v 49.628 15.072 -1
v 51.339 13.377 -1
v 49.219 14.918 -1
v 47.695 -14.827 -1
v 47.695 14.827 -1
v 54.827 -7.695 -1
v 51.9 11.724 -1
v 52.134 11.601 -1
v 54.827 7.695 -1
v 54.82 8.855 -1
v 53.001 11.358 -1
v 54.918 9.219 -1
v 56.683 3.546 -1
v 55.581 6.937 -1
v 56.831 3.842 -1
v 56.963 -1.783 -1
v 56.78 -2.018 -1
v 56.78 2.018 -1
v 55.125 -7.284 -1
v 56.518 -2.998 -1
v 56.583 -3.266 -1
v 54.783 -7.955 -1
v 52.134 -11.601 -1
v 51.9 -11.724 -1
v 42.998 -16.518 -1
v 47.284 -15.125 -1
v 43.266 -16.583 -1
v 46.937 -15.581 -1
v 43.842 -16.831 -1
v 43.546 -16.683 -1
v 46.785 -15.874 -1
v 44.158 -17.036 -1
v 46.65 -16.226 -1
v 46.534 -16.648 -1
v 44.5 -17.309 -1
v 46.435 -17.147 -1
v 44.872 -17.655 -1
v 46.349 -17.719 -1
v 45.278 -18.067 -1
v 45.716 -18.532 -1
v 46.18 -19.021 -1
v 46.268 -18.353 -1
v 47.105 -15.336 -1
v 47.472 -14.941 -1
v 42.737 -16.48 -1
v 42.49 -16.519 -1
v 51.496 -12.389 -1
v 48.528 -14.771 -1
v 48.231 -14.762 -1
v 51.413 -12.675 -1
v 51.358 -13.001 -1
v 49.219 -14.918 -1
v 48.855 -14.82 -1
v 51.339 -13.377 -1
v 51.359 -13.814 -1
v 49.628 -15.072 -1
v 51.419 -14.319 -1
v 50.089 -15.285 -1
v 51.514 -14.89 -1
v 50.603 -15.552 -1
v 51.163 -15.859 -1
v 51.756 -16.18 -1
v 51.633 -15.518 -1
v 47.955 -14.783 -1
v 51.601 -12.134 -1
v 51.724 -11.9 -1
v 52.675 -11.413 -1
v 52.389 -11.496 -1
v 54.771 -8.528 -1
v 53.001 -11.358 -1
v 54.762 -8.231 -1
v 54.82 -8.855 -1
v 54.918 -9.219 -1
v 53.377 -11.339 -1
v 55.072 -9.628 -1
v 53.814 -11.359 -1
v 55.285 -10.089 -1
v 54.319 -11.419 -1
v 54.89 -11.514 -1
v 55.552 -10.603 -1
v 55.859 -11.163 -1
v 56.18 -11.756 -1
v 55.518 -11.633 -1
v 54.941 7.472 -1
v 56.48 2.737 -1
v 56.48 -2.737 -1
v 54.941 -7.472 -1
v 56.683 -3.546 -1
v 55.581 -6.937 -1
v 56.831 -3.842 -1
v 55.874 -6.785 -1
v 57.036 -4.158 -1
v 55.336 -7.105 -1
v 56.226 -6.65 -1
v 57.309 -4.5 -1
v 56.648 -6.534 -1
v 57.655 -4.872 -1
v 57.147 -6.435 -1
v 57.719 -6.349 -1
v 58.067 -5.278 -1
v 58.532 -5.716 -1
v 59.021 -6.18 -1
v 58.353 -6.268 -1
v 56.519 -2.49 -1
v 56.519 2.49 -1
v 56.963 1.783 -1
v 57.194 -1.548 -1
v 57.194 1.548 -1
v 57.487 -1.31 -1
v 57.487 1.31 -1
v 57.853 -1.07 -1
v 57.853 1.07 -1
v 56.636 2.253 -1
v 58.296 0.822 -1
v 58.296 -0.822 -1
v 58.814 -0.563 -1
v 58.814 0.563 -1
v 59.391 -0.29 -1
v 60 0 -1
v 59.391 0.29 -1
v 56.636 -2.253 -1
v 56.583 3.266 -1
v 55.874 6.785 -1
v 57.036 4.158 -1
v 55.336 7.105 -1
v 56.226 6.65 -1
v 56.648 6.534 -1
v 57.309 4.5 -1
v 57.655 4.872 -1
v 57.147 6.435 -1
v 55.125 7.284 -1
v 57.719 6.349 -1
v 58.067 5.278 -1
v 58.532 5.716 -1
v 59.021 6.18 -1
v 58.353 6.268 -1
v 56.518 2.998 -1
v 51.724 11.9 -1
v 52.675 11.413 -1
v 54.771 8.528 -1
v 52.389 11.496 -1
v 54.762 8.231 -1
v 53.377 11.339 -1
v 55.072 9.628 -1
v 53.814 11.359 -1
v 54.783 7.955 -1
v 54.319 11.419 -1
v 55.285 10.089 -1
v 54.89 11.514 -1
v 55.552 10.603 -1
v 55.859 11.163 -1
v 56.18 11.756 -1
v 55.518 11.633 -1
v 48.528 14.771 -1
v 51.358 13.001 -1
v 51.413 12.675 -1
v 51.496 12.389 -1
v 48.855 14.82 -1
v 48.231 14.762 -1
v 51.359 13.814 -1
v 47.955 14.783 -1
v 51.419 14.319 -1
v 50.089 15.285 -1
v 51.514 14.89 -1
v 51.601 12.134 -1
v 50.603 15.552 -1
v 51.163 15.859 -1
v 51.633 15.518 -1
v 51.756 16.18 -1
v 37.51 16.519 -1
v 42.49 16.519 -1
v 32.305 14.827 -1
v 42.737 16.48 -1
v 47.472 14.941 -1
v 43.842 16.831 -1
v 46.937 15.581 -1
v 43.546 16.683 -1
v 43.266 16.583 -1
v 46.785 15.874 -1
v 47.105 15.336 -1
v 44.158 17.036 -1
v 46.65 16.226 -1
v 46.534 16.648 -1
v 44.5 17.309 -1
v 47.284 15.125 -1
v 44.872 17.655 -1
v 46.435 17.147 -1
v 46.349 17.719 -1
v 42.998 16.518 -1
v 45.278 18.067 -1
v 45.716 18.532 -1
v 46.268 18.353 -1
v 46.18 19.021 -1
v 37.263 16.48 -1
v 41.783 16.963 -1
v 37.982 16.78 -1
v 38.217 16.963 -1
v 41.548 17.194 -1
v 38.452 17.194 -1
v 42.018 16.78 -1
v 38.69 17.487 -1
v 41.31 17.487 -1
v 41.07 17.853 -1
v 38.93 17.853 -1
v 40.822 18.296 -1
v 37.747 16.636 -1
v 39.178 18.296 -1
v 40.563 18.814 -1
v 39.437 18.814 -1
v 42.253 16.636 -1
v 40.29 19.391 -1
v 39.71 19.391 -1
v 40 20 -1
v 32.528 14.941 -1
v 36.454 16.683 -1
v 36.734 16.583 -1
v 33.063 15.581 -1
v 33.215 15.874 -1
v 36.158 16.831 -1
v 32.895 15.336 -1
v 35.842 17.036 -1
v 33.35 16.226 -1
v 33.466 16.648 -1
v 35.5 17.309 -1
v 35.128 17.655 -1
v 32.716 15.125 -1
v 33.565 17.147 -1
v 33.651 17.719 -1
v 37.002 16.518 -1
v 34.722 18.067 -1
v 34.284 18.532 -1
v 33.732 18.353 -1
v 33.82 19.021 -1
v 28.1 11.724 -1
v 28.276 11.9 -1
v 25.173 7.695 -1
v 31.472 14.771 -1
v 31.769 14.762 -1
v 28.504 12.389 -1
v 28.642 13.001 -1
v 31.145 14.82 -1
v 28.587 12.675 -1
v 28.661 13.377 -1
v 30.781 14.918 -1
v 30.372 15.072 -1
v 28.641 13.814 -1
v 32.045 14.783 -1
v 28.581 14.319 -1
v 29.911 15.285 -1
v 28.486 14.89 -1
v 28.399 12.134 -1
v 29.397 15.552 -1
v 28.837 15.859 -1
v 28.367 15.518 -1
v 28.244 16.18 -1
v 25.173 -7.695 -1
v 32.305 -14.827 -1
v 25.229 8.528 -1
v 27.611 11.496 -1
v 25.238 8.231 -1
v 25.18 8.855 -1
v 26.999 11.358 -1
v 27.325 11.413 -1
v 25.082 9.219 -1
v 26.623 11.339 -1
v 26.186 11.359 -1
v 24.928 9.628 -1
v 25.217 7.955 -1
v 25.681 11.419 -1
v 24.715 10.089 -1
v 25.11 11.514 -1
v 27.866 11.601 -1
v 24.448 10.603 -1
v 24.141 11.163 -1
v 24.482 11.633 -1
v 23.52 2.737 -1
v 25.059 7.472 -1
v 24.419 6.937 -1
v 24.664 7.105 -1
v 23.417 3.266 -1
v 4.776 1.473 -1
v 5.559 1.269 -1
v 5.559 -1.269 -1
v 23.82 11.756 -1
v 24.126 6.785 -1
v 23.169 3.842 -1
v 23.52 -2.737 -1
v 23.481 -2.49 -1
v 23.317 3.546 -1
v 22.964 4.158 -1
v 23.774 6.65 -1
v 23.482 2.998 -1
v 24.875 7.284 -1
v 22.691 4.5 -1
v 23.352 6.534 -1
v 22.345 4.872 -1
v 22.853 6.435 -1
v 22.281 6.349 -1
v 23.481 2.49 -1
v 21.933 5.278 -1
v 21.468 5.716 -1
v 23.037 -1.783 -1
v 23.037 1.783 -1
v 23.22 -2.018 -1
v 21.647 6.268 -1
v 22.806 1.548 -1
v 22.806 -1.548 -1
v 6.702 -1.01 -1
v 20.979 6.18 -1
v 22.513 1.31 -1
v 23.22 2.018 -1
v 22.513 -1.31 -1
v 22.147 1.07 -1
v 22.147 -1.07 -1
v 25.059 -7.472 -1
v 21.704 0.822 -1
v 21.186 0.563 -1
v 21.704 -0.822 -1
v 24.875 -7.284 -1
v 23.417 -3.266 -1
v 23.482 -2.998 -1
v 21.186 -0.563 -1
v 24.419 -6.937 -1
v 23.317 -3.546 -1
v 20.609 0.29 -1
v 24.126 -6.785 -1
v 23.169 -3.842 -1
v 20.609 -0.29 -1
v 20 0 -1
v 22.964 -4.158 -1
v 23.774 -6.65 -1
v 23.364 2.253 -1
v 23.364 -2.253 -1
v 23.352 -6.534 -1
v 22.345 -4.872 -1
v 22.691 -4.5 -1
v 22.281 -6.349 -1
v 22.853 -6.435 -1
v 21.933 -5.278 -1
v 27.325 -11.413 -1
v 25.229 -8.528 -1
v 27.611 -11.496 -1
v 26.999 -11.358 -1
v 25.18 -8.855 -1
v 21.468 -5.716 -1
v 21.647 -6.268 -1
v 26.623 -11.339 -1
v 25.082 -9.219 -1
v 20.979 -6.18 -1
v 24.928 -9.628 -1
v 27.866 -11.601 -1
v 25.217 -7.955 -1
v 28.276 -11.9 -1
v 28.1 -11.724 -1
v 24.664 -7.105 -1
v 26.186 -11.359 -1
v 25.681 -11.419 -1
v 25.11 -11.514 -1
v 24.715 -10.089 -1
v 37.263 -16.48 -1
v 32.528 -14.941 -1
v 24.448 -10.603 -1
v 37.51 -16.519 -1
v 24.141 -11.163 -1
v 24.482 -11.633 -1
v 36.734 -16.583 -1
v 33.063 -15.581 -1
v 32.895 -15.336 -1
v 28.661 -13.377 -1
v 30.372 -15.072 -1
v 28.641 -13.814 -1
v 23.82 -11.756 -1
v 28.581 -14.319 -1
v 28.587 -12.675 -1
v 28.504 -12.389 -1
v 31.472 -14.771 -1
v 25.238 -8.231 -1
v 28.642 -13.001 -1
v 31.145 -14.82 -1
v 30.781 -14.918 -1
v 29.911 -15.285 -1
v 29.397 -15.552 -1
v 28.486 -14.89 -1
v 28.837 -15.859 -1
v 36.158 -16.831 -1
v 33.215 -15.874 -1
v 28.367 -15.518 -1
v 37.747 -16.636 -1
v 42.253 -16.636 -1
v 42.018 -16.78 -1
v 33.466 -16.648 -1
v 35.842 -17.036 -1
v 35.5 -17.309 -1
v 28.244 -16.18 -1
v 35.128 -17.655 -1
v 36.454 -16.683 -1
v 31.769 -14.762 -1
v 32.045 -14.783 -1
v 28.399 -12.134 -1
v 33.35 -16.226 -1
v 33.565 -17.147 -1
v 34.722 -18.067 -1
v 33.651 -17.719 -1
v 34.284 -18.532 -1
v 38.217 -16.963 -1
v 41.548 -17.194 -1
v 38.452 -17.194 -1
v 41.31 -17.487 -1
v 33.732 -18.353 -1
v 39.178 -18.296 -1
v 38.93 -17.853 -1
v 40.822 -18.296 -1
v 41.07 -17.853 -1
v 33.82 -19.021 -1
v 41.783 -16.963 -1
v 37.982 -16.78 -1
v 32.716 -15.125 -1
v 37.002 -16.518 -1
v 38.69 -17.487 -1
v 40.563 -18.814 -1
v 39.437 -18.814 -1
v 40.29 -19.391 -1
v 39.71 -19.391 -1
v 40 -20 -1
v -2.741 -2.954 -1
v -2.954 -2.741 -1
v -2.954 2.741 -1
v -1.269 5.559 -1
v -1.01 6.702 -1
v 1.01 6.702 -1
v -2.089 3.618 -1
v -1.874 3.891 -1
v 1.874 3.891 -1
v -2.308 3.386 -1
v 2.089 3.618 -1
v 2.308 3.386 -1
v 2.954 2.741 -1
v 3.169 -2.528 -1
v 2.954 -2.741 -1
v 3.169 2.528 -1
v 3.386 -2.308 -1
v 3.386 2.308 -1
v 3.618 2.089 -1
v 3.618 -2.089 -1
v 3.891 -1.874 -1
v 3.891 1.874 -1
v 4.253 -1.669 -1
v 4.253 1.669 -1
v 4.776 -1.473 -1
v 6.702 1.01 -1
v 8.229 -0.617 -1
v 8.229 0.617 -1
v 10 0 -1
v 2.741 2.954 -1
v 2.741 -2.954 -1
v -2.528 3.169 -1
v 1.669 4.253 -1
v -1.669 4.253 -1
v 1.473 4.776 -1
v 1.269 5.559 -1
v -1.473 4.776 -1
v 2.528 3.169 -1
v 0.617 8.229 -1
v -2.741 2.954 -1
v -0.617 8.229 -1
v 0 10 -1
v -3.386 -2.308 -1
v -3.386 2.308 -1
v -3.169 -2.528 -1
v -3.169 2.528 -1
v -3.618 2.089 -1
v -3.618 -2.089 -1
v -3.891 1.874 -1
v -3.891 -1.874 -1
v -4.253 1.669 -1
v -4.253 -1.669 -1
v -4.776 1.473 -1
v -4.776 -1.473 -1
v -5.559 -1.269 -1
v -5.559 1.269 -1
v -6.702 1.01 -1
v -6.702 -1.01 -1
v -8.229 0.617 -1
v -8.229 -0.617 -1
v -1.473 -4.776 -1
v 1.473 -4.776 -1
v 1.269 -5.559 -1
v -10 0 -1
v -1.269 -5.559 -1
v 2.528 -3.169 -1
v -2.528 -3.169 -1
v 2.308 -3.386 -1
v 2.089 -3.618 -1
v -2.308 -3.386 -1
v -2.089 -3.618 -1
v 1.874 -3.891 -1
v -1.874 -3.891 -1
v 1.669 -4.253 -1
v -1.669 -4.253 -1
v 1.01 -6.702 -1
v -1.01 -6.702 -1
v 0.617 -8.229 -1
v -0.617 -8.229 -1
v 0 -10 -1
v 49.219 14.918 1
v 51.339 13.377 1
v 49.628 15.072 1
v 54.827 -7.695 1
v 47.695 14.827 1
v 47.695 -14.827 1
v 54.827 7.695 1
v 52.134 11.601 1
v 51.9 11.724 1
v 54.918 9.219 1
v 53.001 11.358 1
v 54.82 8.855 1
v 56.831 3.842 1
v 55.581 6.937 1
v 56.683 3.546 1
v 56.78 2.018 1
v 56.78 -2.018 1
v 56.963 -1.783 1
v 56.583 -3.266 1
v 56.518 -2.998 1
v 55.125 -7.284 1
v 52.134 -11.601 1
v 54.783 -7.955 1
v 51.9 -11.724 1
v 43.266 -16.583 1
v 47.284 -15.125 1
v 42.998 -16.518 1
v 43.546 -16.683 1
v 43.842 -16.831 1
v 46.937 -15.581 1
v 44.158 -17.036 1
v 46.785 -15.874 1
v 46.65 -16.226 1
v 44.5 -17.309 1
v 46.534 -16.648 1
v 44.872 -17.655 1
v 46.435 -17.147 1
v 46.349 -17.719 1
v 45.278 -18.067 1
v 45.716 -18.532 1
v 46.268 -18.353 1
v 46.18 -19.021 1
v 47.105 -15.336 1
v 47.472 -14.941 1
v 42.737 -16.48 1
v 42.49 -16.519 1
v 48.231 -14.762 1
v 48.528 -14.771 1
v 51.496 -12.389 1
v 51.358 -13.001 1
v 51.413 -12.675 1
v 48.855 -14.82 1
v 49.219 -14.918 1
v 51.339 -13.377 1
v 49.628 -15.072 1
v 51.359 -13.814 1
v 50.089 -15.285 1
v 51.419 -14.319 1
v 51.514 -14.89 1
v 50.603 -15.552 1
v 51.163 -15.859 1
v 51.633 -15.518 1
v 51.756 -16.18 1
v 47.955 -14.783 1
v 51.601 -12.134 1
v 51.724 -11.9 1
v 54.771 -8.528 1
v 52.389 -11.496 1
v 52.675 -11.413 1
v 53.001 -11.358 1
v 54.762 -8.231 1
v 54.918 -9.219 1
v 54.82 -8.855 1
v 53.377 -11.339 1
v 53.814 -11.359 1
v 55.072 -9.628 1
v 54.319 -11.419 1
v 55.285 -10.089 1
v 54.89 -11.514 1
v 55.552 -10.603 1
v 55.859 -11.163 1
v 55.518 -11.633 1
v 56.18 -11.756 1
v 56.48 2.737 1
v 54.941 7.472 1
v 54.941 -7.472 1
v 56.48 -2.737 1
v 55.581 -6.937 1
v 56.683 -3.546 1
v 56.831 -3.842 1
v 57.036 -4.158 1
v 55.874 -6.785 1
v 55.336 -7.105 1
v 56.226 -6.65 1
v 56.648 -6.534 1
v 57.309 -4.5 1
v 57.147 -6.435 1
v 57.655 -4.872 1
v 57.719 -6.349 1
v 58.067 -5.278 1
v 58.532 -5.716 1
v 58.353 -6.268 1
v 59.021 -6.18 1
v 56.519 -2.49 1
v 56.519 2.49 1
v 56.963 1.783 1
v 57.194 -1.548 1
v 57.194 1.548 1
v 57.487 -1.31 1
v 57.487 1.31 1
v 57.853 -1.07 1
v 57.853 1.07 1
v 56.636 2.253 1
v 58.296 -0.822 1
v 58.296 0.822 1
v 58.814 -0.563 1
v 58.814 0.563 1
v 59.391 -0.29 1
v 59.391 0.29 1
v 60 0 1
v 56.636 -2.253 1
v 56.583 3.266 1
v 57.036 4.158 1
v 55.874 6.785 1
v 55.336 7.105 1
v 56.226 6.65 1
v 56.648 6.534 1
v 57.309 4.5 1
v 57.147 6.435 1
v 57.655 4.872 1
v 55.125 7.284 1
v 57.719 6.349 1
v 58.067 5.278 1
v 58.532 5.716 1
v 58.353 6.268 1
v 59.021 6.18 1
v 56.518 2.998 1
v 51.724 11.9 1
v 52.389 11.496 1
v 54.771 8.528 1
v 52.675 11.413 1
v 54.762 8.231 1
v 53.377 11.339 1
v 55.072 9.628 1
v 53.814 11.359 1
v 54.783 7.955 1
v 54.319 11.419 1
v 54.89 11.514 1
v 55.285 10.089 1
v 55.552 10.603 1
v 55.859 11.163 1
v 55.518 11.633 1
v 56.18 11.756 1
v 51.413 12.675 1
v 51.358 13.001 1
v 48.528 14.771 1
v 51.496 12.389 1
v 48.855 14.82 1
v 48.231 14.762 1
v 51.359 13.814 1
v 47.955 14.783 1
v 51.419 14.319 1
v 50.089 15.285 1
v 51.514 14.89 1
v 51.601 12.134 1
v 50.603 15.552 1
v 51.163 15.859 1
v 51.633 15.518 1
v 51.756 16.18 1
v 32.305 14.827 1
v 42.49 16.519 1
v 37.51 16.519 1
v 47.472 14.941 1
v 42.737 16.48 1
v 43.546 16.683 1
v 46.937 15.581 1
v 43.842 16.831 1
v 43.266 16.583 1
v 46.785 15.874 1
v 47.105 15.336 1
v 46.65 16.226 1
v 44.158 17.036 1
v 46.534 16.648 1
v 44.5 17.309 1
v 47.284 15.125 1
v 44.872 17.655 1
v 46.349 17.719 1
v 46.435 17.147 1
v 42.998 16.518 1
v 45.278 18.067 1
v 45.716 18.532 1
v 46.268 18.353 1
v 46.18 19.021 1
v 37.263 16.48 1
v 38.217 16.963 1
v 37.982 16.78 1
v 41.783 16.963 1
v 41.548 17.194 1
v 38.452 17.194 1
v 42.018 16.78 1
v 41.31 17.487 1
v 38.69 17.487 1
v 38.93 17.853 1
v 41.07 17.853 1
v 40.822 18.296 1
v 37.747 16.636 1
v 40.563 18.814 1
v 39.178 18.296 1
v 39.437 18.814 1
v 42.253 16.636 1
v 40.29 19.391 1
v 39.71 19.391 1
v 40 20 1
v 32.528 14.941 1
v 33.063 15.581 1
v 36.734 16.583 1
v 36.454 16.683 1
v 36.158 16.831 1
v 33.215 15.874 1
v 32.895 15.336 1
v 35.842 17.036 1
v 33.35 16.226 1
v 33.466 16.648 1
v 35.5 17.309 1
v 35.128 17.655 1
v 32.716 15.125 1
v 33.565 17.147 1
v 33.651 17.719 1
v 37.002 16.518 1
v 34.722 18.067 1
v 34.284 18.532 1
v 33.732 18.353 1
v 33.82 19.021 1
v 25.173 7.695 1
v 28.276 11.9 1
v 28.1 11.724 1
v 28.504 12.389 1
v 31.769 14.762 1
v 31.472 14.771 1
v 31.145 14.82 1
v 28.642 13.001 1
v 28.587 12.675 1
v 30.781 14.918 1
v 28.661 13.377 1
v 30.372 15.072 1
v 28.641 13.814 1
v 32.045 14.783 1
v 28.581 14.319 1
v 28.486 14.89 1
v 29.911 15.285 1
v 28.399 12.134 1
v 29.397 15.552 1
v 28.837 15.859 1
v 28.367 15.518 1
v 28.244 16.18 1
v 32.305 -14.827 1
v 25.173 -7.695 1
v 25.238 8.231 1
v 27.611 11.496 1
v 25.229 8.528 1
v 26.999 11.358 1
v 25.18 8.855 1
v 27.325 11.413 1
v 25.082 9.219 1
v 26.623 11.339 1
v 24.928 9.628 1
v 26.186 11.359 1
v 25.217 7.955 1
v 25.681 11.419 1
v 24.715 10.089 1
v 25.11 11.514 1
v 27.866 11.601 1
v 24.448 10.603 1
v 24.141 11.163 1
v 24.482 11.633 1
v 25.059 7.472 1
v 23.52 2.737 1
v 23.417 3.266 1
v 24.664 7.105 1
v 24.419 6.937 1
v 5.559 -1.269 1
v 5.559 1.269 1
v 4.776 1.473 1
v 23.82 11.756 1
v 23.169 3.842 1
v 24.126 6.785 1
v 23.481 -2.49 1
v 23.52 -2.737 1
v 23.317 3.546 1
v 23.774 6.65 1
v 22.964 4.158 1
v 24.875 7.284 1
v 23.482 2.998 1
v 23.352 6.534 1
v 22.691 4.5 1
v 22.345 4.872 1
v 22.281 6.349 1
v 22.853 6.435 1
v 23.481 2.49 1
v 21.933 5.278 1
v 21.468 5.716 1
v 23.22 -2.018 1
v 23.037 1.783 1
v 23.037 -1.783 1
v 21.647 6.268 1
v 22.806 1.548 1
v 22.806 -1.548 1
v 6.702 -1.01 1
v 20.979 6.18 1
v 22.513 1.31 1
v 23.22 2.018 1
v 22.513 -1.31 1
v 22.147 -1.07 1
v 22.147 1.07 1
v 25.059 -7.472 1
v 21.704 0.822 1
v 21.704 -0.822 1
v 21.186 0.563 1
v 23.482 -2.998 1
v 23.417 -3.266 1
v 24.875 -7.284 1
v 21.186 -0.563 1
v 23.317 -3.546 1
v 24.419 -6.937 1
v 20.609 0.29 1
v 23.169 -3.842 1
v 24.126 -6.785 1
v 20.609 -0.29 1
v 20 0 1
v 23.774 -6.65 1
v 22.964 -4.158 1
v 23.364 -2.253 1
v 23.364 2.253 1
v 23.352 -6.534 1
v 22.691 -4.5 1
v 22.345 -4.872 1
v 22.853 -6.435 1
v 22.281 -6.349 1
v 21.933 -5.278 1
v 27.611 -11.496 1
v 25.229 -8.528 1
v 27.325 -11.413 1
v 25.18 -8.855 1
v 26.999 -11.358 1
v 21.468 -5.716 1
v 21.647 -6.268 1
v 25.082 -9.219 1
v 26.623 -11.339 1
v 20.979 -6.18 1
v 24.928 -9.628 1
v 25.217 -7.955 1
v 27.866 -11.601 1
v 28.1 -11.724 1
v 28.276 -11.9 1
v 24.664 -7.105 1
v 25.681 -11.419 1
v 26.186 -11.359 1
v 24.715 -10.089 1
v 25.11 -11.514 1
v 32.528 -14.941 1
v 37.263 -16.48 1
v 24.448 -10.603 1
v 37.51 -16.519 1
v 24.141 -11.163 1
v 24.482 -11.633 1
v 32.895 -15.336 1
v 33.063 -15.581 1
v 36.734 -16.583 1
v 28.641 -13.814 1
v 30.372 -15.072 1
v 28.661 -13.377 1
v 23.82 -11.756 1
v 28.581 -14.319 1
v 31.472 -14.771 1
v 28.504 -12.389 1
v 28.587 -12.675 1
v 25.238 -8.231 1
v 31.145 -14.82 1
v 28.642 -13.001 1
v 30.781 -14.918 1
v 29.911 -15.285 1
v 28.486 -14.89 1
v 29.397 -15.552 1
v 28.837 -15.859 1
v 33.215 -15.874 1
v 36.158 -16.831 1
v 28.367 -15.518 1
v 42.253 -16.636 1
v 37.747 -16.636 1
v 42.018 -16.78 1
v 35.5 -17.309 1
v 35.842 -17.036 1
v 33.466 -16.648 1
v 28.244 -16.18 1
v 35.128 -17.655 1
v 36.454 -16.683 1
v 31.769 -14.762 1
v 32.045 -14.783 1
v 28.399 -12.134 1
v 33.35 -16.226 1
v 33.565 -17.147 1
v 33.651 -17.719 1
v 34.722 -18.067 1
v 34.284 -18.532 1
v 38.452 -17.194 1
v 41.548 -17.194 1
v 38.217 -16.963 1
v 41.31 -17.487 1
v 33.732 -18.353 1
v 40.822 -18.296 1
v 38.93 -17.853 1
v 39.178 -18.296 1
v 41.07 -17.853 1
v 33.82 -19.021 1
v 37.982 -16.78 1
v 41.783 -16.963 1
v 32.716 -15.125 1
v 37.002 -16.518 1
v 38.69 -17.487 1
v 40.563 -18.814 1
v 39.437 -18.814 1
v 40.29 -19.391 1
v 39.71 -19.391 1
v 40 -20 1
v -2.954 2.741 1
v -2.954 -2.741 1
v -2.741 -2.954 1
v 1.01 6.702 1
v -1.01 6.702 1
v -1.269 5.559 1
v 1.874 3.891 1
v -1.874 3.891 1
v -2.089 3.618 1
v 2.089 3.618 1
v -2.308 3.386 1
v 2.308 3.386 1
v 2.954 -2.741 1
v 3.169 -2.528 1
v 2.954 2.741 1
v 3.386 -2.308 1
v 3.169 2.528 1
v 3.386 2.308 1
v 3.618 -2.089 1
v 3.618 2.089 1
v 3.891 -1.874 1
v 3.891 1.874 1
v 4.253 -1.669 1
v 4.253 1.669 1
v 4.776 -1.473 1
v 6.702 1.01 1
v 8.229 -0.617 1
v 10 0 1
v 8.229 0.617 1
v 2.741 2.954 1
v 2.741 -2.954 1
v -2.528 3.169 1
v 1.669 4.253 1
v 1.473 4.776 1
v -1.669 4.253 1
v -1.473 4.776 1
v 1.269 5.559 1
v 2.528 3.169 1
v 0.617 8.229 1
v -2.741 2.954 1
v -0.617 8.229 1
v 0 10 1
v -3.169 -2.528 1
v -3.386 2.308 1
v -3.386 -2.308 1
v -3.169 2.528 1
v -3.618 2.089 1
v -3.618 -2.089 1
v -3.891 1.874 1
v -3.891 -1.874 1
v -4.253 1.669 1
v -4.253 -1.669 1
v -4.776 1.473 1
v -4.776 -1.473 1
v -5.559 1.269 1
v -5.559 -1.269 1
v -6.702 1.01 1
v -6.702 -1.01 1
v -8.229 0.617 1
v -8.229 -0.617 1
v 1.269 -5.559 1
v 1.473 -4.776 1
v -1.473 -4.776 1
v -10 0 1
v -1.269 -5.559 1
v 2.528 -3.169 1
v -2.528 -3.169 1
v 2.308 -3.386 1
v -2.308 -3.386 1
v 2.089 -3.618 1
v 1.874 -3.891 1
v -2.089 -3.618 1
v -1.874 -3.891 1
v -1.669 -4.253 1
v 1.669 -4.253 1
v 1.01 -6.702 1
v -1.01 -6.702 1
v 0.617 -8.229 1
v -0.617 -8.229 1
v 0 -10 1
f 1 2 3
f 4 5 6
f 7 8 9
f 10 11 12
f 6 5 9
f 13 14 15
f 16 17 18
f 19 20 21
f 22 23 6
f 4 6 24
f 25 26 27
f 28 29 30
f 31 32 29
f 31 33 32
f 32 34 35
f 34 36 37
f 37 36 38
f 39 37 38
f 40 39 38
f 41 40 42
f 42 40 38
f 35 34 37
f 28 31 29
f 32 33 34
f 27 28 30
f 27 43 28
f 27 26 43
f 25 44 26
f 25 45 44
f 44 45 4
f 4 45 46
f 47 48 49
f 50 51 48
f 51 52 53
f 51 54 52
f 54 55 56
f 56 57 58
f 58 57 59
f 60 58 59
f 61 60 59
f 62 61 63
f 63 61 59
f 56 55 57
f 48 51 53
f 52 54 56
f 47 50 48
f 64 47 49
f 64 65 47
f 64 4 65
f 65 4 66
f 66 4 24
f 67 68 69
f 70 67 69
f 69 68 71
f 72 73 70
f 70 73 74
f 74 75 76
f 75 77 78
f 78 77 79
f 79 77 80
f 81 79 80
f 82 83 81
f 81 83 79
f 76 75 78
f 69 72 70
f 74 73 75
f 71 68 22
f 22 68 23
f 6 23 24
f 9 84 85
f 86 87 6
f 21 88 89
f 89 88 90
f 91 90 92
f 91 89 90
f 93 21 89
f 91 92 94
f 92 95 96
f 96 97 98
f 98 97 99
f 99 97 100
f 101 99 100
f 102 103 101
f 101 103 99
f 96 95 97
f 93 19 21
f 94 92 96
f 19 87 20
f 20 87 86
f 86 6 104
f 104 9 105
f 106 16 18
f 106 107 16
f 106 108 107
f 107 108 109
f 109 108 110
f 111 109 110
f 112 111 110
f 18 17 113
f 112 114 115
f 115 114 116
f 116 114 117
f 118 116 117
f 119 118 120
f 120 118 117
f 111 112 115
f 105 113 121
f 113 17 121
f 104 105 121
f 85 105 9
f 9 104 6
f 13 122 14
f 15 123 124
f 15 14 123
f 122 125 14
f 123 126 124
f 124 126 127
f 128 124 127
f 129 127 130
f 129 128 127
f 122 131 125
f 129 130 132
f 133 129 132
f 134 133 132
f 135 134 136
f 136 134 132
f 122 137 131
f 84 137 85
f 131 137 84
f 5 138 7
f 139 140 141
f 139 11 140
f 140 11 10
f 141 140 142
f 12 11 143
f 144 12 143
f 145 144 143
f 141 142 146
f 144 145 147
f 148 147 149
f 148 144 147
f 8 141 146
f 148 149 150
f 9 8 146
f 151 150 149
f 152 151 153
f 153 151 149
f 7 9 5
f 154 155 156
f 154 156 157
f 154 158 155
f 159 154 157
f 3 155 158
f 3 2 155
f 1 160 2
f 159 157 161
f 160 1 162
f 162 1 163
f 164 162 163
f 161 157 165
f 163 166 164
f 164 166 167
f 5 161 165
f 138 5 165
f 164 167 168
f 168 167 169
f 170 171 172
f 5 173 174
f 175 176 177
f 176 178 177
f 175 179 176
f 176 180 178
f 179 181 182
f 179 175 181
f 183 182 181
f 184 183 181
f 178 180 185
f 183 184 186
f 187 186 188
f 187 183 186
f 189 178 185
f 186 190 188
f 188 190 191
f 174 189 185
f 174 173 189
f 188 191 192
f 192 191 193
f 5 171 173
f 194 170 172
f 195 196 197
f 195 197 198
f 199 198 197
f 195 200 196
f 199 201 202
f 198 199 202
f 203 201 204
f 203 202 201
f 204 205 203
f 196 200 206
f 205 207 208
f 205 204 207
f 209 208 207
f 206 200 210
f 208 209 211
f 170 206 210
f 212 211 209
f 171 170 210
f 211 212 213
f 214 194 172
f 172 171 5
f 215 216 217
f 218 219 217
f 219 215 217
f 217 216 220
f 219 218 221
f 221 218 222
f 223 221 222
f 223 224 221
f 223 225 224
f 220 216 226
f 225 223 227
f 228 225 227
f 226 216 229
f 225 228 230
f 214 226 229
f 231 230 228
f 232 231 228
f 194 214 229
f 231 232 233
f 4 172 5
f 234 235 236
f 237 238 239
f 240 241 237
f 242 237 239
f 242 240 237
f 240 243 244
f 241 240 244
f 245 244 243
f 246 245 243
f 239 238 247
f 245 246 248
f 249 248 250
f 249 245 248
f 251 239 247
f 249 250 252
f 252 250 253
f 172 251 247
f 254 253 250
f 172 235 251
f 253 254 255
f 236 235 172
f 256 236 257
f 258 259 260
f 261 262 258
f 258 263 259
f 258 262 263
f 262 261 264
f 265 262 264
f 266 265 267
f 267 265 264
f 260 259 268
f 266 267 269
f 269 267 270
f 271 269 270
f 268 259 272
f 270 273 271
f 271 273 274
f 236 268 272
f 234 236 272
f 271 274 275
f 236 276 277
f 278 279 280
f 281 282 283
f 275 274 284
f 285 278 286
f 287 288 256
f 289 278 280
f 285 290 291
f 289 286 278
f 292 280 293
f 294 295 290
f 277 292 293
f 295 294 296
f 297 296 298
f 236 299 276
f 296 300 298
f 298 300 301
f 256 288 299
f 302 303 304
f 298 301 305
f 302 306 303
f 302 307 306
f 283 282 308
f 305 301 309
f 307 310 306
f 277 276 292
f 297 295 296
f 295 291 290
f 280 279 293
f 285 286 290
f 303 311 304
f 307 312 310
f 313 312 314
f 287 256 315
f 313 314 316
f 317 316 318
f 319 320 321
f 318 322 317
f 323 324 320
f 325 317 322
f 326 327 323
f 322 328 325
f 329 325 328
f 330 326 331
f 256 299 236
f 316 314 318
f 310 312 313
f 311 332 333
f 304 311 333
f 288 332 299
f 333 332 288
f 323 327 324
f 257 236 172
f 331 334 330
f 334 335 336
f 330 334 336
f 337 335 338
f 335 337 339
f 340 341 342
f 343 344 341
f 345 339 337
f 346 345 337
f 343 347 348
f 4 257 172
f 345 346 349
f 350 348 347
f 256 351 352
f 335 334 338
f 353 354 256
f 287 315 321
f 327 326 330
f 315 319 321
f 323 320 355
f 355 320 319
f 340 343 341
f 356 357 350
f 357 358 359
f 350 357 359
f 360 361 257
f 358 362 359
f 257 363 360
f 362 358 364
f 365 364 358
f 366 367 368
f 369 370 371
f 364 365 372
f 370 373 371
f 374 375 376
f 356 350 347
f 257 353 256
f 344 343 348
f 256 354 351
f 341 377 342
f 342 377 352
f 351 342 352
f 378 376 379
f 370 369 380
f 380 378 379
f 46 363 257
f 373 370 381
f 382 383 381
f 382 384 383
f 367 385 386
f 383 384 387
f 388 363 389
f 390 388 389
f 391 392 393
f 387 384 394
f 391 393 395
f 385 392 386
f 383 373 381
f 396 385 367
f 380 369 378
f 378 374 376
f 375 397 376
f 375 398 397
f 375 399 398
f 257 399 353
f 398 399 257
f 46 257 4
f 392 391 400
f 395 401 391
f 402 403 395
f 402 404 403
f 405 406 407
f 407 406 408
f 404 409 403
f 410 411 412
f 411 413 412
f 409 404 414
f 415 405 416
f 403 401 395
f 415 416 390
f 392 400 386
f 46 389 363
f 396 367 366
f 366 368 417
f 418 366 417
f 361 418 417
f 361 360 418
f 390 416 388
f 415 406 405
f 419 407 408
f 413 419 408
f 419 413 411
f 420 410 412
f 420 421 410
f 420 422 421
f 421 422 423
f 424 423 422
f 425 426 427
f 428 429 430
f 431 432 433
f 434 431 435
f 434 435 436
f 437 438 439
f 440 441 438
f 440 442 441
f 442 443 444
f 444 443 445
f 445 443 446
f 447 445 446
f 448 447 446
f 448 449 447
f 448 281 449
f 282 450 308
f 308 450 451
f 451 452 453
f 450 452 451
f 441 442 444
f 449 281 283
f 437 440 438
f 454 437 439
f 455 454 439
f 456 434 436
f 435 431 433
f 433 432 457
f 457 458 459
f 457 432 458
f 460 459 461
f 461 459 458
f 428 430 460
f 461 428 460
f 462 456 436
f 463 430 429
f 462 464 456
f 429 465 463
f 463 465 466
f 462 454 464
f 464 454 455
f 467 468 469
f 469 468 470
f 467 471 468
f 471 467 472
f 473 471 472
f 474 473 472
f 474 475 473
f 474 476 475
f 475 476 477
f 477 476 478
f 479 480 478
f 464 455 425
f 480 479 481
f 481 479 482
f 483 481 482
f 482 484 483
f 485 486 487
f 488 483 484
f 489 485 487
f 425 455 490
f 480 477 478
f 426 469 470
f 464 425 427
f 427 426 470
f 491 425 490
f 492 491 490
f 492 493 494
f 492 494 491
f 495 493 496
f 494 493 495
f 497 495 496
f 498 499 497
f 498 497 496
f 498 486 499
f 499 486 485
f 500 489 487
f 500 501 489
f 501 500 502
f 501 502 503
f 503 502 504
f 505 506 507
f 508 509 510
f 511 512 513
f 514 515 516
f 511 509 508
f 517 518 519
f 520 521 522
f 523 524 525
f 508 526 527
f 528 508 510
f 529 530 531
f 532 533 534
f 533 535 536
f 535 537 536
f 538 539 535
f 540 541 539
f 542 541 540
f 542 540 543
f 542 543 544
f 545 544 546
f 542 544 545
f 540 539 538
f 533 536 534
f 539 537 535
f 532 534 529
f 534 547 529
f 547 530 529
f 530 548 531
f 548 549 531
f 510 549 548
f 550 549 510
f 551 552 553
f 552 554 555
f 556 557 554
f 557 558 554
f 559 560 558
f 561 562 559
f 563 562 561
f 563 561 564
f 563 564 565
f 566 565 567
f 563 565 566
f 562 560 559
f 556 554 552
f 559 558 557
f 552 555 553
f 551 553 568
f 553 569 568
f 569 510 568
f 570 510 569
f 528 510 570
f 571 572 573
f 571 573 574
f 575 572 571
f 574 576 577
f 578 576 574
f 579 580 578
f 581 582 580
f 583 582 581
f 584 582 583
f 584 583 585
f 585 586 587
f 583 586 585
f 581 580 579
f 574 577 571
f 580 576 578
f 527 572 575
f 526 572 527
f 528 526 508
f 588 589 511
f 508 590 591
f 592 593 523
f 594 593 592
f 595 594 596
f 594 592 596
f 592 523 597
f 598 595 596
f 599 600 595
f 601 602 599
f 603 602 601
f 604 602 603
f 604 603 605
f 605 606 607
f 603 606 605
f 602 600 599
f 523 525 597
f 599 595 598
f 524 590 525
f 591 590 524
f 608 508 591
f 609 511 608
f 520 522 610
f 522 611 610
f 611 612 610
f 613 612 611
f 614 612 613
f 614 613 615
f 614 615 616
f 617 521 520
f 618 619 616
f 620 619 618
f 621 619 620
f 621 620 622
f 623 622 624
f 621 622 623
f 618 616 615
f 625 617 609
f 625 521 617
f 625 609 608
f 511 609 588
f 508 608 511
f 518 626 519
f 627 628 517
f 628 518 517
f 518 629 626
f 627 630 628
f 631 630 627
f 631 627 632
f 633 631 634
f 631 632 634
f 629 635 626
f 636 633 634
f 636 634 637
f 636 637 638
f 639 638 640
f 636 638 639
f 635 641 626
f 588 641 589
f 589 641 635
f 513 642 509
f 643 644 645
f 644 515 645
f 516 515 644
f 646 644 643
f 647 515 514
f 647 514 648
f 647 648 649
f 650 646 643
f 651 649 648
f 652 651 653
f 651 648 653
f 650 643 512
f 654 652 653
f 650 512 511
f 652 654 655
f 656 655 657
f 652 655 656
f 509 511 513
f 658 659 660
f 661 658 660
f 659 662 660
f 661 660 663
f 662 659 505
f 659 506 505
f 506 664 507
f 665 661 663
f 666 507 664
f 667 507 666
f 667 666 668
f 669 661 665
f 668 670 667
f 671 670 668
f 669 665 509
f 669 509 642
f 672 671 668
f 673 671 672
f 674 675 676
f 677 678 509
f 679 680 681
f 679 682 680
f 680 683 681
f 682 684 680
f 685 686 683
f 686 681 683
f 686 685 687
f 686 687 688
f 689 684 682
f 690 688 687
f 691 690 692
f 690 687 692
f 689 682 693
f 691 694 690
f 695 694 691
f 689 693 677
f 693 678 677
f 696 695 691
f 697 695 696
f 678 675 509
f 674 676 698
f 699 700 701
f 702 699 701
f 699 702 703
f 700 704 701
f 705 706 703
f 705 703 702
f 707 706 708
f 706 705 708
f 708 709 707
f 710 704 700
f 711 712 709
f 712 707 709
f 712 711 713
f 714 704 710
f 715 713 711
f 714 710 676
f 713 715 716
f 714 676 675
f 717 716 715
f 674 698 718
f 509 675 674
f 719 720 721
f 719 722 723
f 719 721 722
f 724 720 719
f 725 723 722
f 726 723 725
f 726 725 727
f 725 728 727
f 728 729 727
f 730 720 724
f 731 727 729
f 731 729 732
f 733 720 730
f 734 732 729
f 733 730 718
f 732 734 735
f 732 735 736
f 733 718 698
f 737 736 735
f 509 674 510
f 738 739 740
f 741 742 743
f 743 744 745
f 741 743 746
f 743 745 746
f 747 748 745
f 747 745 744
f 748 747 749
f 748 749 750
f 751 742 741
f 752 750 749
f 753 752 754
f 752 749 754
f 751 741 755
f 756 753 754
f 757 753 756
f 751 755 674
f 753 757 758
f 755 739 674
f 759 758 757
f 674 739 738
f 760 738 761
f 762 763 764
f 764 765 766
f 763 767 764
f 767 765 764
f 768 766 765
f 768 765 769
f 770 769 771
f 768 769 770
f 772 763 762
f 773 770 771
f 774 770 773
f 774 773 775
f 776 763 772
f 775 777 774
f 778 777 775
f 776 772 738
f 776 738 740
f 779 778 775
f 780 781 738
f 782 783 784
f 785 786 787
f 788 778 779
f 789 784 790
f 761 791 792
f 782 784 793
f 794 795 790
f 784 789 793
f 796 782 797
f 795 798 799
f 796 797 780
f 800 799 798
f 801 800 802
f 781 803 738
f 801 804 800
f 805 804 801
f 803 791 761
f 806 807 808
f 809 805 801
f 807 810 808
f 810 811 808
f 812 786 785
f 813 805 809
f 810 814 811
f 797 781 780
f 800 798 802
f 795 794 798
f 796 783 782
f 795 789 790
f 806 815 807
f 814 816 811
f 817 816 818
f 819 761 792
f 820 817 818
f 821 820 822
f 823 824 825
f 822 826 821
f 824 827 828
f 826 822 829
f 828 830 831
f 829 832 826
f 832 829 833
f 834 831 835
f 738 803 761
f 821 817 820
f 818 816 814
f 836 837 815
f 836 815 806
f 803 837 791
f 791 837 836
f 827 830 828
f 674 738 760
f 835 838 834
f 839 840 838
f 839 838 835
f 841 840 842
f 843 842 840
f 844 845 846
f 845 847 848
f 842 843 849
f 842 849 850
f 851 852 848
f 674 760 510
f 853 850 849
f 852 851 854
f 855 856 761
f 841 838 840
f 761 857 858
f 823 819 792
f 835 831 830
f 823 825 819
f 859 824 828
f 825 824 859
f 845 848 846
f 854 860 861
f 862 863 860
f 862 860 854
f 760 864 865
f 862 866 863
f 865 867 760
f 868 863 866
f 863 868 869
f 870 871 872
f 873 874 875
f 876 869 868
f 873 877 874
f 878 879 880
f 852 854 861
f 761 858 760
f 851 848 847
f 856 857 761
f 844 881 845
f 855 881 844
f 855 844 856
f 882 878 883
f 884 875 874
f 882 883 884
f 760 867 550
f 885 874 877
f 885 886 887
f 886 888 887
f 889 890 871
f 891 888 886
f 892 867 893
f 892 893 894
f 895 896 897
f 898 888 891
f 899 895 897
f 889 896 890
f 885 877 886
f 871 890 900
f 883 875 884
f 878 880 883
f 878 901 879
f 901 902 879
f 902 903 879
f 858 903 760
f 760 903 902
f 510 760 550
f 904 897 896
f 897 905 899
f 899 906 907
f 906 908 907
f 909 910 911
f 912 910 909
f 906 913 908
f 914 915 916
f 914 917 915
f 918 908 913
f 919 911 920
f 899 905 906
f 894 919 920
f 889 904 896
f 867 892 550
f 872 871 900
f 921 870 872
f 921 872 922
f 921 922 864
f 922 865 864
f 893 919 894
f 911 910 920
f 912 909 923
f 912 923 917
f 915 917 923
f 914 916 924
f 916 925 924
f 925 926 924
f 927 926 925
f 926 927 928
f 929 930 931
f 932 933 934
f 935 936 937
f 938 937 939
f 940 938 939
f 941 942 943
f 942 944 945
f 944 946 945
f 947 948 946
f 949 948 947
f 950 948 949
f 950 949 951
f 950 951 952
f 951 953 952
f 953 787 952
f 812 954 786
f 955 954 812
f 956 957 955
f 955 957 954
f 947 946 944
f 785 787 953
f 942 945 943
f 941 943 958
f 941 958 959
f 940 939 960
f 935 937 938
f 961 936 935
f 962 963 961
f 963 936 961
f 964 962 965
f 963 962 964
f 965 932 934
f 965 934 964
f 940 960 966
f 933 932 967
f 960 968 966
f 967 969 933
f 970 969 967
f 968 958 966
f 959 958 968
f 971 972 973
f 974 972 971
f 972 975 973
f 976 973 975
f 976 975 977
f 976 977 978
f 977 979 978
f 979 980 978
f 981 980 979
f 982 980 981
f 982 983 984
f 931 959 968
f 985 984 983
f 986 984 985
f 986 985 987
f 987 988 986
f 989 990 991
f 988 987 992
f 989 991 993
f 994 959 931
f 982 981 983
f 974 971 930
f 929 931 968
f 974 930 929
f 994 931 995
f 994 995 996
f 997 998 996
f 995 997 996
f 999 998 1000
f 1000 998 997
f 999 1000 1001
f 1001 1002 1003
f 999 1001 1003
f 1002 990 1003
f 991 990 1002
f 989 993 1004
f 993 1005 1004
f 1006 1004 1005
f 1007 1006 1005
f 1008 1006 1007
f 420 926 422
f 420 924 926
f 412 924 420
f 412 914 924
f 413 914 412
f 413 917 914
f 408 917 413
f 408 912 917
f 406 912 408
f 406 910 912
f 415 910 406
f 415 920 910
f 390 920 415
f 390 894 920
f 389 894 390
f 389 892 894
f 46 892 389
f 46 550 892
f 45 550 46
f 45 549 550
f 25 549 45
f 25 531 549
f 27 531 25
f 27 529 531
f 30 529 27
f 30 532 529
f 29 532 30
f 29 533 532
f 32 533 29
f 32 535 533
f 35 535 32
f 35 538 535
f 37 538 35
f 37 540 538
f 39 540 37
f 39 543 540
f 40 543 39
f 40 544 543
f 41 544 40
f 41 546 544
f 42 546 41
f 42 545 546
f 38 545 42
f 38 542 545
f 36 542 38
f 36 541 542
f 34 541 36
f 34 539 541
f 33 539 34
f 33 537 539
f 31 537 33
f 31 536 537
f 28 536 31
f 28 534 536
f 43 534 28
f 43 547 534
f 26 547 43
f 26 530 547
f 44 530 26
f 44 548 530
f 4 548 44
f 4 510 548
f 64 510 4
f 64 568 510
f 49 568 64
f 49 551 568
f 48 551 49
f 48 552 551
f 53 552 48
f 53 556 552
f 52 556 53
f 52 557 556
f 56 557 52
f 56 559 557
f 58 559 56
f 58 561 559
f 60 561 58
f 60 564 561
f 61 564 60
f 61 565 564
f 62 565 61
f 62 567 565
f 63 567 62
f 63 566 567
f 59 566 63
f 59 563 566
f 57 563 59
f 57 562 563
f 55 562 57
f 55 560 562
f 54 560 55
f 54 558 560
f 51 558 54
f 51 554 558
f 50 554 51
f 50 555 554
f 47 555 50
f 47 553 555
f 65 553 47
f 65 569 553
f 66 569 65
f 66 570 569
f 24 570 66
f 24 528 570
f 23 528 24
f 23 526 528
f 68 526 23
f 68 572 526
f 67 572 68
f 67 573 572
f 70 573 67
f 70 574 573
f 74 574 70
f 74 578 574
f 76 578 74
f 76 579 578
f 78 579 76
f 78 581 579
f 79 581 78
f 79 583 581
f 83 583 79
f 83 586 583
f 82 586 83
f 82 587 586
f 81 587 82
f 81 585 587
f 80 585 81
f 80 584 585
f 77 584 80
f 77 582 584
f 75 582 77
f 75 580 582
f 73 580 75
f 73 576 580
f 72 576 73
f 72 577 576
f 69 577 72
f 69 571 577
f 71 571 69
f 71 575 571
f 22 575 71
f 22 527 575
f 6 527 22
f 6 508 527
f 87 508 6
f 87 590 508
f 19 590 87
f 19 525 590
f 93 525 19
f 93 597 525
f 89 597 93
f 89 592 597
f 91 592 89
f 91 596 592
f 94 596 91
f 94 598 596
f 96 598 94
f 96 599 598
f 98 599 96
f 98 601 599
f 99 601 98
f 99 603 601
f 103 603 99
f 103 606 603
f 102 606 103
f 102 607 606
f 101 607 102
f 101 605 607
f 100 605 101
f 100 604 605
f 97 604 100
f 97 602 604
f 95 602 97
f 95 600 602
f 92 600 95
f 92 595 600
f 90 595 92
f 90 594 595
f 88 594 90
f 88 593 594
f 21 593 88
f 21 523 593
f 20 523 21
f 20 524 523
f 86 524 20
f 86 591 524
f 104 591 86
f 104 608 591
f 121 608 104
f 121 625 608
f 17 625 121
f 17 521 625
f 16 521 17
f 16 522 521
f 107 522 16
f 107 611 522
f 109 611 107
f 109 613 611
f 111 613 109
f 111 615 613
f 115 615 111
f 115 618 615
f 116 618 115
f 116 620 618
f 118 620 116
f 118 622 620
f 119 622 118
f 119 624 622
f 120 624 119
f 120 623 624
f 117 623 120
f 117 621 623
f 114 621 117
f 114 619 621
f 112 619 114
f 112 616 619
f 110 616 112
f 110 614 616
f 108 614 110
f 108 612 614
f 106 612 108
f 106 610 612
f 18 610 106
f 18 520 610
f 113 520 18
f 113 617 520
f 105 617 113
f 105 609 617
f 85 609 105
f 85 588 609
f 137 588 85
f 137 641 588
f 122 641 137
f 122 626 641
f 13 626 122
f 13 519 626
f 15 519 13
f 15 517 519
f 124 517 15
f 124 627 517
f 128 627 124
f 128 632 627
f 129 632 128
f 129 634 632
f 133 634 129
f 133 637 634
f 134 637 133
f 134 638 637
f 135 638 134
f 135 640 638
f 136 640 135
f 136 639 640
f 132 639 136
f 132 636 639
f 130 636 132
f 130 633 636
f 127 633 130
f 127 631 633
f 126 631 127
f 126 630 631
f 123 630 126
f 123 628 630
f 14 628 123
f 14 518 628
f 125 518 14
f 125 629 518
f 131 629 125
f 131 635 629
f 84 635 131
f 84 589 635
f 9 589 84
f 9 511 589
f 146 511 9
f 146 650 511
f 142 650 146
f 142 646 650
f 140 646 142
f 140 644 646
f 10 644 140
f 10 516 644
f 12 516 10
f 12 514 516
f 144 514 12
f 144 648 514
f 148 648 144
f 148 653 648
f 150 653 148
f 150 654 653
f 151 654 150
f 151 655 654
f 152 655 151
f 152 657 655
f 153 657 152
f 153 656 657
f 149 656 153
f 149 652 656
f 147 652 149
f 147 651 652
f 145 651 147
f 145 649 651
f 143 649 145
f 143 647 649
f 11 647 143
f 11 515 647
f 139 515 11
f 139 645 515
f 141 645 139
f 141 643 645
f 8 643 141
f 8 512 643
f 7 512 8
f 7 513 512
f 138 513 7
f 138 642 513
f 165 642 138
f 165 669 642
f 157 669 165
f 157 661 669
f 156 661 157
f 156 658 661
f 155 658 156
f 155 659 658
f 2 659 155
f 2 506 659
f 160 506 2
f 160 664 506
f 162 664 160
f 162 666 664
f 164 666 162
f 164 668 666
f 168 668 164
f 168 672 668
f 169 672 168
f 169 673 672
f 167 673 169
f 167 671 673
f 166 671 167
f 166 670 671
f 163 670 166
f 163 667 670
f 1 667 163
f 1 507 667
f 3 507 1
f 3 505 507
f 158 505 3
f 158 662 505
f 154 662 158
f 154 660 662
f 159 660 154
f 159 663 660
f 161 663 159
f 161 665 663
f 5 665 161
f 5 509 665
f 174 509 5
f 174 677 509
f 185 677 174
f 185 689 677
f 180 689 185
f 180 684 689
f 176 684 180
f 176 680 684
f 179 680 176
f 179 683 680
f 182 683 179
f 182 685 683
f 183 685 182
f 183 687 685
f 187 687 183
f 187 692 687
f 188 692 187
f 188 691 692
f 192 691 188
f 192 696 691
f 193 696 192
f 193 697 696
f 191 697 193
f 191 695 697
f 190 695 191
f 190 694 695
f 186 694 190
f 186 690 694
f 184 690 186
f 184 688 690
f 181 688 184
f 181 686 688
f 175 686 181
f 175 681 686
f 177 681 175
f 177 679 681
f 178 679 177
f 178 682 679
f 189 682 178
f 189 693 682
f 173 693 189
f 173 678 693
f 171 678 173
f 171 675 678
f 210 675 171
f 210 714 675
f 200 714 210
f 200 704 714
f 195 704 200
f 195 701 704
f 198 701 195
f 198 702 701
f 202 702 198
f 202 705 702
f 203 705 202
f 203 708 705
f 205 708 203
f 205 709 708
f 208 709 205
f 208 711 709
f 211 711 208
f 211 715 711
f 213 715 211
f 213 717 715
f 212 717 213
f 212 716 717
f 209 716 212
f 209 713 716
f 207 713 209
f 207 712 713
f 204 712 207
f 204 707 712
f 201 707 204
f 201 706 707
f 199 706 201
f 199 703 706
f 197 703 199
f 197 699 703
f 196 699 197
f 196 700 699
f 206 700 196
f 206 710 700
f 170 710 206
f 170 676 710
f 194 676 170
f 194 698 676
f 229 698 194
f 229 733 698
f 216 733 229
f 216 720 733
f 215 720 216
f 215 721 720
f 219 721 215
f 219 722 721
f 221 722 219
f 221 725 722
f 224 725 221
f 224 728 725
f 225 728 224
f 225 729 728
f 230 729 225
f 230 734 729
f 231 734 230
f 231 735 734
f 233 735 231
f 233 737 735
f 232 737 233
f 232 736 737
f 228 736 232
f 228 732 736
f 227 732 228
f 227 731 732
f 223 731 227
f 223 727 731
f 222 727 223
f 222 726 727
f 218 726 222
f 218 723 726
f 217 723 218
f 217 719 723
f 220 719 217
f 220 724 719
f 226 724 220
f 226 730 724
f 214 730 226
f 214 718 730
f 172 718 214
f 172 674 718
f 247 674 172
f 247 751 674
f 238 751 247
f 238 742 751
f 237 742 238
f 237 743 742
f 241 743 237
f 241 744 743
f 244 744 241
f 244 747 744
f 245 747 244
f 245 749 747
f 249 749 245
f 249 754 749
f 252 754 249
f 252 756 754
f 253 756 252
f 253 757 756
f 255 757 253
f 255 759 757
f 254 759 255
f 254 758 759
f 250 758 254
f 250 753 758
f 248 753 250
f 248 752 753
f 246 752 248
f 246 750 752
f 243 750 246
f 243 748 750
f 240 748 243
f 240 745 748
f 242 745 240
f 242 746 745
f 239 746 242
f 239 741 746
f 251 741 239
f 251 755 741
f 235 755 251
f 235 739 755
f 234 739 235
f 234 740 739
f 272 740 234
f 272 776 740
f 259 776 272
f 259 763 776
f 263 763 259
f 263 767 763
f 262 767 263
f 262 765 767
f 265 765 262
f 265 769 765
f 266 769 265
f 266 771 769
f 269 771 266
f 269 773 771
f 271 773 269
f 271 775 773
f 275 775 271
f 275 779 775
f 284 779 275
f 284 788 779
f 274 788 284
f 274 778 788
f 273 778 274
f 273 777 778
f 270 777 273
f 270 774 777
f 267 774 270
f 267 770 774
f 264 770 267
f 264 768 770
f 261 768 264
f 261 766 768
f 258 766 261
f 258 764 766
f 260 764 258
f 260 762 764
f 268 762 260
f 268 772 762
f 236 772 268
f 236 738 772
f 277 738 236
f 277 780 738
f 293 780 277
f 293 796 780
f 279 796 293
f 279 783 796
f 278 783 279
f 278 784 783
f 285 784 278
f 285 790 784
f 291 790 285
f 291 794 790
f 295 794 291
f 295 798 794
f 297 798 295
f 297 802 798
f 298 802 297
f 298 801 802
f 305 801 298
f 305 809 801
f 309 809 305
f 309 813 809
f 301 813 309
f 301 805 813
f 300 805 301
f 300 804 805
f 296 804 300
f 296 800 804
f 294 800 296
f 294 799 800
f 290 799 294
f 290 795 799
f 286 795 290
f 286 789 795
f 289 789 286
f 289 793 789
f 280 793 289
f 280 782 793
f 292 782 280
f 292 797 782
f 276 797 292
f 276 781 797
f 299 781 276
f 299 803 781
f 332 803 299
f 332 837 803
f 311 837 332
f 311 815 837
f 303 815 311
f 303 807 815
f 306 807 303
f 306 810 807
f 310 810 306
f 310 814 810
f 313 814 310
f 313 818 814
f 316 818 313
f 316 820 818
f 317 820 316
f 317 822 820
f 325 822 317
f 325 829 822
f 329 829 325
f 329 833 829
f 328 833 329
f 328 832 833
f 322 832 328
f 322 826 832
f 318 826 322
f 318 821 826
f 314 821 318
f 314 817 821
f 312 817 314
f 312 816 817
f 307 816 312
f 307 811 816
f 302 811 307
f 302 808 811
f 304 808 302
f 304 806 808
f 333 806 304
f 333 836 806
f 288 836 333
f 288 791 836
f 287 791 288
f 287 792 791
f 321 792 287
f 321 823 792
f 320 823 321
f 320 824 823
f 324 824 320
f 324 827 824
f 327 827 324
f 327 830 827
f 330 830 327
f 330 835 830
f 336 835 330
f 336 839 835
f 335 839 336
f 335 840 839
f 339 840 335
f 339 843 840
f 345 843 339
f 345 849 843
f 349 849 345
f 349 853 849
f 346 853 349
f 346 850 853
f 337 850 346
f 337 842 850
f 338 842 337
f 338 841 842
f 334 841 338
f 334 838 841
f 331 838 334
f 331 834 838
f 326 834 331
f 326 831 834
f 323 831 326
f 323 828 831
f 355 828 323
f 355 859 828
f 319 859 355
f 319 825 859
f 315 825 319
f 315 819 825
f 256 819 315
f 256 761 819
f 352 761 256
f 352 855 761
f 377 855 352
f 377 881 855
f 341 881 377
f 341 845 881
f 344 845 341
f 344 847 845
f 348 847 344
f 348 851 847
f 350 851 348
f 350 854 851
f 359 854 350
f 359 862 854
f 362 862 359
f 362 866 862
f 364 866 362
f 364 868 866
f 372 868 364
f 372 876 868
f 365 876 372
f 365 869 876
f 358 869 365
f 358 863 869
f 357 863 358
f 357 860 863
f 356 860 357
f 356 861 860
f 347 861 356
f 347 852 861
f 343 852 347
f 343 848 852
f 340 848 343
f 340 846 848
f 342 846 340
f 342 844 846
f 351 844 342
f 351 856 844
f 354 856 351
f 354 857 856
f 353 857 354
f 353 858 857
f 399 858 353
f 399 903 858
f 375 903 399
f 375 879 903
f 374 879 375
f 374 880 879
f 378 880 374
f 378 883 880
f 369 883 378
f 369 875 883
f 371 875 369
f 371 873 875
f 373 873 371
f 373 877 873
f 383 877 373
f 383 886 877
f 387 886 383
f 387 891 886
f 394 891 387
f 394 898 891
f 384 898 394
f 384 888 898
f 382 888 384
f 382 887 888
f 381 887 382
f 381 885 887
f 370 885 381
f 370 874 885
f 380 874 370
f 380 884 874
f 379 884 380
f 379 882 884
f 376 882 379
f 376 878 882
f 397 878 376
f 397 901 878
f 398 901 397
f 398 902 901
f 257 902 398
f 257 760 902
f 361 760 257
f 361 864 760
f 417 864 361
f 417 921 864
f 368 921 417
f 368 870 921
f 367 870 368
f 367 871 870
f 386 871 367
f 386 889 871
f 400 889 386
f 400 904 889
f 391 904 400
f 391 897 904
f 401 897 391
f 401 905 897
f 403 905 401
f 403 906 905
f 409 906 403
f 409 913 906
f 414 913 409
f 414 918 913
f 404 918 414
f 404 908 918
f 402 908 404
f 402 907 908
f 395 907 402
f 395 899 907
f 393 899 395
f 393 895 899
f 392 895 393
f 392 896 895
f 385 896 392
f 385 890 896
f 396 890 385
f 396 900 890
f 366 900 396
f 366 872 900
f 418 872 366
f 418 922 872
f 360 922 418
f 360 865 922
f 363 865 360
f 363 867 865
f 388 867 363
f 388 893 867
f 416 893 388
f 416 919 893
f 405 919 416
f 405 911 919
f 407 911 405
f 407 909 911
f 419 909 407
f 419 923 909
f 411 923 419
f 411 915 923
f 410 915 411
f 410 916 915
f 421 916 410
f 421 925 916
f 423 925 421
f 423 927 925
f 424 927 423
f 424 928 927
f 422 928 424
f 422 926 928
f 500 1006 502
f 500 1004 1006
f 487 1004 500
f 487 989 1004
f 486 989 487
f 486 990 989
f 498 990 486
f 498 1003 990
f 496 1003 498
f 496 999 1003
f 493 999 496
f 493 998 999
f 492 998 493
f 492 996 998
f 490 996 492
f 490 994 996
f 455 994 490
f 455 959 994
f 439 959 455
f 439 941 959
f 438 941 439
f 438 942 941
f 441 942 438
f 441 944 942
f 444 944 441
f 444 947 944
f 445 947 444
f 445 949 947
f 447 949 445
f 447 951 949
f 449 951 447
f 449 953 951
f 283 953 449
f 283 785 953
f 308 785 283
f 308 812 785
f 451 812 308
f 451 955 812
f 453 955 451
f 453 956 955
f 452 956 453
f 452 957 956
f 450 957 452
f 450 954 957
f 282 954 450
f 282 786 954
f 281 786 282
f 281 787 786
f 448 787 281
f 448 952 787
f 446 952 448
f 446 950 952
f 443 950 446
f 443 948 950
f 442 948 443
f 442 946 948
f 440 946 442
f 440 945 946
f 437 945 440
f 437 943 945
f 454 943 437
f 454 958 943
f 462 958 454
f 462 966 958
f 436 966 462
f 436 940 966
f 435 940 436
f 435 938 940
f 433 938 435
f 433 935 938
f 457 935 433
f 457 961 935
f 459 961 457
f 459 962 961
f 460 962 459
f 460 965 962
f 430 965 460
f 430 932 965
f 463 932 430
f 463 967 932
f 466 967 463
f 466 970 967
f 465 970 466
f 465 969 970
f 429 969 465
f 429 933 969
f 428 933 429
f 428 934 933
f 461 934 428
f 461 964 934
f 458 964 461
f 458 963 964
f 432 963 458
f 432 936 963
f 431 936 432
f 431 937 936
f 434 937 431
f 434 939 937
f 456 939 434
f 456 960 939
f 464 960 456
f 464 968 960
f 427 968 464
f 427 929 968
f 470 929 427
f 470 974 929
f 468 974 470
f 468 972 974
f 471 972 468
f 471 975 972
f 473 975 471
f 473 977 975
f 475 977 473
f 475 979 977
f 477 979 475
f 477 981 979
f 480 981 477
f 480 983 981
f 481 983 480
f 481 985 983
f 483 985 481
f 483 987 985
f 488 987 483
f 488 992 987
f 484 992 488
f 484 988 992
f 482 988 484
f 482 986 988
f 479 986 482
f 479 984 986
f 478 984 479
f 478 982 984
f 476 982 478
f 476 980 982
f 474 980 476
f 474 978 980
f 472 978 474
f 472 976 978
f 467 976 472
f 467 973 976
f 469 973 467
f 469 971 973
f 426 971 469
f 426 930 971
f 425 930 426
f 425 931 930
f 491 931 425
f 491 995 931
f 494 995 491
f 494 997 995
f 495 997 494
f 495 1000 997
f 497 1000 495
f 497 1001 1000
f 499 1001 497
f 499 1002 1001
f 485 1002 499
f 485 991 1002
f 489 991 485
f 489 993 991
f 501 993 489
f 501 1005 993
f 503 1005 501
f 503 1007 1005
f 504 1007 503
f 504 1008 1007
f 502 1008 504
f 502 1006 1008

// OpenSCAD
function logistic(x, k=1, g=3) = g * (1 / (1 + exp(-k * x)) - 1/2);

function r(rad, b, fn, k, g) = rad - logistic(min(b, fn + 1 - b), k, g);

function angle(a, b, verts, step) = a * 360 / verts + b * step;

module pointy(rad=3, fn = 2, verts=3, k=1, g=3) {
    step = 360 / ((fn + 1) * verts);
    points = concat(
        [for(a = [0 : verts - 1])
            for(b = [0 : fn])[
                r(rad, b, fn, k / fn, g) * cos(angle(a, b, verts, step)), r(rad, b, fn, k / fn, g) * sin(angle(a, b, verts, step))
            ]
        ]
    );
    echo([0 : 1 : verts]);
    polygon(points);
}

linear_extrude(height = 2, center = true, convexity = 10){
    pointy(verts=4, fn=20, k=12, g=12, rad=10);
    
    translate([40, 0, 0]) pointy(verts=20, fn=20, k=7, g=7, rad=20);
}
